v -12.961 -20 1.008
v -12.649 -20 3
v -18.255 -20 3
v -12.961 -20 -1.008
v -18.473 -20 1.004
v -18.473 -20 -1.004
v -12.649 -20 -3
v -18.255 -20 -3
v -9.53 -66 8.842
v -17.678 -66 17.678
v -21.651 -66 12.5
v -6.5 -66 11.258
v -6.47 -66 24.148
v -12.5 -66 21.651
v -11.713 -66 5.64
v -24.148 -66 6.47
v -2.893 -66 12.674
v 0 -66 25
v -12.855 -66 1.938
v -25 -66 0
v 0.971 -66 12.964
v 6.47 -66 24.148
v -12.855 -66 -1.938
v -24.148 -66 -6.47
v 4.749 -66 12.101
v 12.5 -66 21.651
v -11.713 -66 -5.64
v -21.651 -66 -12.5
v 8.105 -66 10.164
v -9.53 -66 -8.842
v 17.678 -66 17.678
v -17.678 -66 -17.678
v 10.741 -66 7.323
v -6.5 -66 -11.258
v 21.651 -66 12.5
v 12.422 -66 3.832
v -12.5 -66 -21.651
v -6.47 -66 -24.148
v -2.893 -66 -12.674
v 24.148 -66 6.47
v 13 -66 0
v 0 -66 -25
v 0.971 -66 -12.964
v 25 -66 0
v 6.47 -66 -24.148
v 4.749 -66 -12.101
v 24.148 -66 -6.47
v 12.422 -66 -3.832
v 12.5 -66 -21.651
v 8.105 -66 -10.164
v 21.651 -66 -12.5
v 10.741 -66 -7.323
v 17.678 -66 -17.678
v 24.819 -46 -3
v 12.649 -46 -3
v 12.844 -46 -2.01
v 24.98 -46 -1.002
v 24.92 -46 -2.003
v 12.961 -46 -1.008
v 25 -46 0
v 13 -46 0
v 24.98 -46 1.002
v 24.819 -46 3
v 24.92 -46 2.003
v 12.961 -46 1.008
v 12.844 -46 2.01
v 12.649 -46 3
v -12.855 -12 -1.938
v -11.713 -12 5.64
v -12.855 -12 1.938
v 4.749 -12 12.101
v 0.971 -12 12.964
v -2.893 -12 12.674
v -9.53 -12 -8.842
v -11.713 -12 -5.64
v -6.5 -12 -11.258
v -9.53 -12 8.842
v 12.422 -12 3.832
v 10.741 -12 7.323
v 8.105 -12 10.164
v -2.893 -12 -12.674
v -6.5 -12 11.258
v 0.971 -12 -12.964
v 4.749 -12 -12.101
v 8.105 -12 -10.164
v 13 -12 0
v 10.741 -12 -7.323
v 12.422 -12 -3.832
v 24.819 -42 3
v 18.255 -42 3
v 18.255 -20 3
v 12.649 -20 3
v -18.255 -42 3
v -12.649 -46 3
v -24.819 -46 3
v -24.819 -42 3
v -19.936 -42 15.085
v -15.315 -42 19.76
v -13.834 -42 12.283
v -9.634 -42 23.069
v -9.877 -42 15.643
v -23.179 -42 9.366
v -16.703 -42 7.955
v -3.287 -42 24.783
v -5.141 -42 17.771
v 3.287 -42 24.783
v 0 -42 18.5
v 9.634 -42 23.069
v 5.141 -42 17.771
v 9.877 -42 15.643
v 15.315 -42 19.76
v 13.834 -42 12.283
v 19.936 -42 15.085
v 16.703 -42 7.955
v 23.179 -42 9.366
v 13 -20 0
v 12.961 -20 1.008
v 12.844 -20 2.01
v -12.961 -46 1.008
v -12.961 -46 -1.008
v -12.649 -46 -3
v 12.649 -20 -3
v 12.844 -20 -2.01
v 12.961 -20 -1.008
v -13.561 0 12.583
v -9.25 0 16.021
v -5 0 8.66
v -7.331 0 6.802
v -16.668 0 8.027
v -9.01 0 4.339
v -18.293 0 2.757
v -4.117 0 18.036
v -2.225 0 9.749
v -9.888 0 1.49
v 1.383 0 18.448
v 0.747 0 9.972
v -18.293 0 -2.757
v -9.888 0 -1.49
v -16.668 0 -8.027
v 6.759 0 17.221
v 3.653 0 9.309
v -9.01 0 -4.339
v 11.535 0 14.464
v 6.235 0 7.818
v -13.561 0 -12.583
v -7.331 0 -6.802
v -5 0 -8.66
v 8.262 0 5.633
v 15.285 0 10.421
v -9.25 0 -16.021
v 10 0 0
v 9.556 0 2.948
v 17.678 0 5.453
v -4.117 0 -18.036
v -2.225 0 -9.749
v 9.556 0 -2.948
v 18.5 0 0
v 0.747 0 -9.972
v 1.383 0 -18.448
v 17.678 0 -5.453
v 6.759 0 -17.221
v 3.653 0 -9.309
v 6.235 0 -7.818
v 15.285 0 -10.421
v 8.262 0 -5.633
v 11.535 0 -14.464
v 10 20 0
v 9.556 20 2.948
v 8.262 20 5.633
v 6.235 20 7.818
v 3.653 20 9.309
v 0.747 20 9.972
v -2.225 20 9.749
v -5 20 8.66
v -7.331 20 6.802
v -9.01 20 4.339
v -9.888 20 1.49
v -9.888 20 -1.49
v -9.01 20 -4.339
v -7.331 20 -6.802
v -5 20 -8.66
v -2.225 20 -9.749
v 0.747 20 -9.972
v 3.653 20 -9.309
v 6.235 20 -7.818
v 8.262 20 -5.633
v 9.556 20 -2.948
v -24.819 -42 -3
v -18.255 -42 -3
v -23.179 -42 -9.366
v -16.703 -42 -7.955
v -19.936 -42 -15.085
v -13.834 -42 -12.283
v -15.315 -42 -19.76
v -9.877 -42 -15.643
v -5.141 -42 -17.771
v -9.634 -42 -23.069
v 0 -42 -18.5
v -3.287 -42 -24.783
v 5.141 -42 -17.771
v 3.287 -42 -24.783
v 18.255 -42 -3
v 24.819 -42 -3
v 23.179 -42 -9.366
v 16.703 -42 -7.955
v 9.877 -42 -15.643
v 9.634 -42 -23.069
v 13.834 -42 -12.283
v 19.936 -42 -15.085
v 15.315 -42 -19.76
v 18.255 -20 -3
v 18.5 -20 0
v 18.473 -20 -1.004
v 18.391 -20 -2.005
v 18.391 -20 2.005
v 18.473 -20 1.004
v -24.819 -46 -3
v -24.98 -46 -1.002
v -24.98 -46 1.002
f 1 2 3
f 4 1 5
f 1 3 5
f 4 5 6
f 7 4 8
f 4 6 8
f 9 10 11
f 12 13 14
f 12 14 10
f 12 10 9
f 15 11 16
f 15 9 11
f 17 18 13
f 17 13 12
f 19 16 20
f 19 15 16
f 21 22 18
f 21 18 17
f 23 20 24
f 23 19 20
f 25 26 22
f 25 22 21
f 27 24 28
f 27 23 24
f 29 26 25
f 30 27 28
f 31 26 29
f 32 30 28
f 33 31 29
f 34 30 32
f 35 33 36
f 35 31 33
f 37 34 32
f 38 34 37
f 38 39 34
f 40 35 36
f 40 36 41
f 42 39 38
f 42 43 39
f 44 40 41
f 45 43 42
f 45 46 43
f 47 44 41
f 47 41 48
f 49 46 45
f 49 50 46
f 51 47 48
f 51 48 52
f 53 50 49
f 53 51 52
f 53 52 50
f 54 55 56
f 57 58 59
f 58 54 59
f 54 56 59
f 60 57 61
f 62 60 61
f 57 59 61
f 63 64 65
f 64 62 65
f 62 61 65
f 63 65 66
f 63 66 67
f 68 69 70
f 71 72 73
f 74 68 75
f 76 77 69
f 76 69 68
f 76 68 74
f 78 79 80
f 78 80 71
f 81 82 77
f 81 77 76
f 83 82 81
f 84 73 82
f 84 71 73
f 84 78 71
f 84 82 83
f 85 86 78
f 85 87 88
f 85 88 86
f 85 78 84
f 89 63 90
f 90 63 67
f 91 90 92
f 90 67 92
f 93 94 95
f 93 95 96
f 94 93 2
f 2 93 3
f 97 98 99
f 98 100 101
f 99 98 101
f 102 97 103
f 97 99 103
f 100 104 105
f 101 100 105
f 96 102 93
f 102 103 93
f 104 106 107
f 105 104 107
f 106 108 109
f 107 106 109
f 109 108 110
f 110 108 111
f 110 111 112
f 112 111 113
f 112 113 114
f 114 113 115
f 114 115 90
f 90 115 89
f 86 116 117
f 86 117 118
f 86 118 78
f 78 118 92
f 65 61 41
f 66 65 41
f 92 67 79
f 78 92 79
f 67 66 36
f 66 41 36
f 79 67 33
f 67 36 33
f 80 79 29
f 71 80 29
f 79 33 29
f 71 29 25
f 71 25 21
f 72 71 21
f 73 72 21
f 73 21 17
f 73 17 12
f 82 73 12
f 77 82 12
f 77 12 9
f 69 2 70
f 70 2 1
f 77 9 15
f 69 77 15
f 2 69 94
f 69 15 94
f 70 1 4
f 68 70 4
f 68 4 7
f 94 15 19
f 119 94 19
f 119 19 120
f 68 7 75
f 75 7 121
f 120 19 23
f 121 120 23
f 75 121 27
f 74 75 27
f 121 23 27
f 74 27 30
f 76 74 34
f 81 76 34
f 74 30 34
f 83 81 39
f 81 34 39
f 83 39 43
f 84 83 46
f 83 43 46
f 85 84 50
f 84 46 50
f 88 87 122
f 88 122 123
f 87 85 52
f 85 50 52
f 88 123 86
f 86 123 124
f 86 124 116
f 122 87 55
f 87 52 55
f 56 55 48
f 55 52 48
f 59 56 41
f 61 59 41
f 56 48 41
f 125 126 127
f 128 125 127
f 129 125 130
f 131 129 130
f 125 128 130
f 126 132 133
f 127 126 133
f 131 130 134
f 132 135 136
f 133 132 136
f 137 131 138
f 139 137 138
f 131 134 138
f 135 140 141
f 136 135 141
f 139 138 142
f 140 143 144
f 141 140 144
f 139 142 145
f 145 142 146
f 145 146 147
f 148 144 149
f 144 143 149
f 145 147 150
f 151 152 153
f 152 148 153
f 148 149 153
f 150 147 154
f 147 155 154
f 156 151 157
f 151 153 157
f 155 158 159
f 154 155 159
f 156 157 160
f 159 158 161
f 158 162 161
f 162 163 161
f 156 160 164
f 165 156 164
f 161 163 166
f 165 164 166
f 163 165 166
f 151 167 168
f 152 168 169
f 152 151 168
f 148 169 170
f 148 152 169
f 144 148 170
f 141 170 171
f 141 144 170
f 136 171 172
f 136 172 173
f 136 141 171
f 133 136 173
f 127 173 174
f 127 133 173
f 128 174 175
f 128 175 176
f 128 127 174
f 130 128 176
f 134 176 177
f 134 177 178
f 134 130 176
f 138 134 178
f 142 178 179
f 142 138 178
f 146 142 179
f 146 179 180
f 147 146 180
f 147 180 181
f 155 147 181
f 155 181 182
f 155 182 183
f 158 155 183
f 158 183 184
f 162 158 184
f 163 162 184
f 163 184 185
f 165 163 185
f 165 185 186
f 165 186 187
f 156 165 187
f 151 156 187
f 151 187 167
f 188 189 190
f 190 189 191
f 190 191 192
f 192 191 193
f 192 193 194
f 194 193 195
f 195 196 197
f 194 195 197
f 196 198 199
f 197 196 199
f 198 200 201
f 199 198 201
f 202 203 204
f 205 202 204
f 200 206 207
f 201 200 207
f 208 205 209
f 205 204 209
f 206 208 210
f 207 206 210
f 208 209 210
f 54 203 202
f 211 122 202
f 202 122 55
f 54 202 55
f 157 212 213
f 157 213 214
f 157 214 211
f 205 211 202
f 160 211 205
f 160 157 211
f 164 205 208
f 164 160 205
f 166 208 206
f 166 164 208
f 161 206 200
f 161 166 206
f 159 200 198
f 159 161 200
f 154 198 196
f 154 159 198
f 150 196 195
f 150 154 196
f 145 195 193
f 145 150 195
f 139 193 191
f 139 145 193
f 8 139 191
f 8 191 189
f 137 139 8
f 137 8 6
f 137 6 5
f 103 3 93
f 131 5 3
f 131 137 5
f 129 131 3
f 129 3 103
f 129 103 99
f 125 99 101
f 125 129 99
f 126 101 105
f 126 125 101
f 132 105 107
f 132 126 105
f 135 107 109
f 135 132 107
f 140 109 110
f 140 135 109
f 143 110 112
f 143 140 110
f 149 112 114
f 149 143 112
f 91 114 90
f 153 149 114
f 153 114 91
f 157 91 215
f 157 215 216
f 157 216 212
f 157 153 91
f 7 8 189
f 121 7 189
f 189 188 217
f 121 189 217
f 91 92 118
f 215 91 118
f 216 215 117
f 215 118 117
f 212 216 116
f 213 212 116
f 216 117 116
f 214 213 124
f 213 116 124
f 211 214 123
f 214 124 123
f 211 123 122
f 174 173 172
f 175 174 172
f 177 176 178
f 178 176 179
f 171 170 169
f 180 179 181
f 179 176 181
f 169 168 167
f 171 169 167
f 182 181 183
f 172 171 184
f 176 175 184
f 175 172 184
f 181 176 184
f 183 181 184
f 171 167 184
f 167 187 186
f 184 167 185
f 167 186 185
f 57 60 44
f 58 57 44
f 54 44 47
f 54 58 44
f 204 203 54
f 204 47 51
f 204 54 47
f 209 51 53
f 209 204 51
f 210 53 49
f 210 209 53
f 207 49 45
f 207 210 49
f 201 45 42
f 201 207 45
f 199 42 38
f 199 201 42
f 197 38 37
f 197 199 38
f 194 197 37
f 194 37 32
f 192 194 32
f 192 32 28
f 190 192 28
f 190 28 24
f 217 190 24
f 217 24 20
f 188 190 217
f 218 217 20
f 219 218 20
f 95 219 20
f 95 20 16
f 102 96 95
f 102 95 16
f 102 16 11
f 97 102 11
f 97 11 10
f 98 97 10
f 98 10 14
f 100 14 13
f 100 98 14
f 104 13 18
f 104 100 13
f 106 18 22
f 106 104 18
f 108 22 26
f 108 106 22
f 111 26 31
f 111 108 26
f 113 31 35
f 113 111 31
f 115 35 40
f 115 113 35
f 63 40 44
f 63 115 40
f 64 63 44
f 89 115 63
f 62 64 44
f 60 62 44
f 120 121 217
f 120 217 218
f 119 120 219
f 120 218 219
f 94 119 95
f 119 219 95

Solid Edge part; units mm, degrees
sketch "Sketch1" plane through (0, 0, 0) normal (0, -1, 0) x (1, 0, 0)
  circle A0 centre (0, 0) radius 10
extrude "Protrusion1" add sketch "Sketch1" against normal blind 20
sketch "Sketch2" plane through (0, 0, 0) normal (0, -1, 0) x (1, 0, 0)
  circle A0 centre (0, 0) radius 18.5
extrude "ExtrudedProtrusion_2" add sketch "Sketch2" along normal blind 42
sketch "Sketch3" plane through (0, -42, 0) normal (0, -1, 0) x (1, 0, 0)
  circle A0 centre (0, 0) radius 25
extrude "ExtrudedProtrusion_3" add sketch "Sketch3" along normal blind 24
sketch "Sketch4" plane through (0, -66, 0) normal (0, -1, 0) x (1, 0, 0)
  circle A0 centre (0, 0) radius 13
extrude "ExtrudedCutout_1" cut sketch "Sketch4" against normal blind 54
sketch "Sketch5" plane through (0, 0, 0) normal (1, 0, 0) x (0, 1, 0)
  line L0 (-46, 3) -> (-20, 3)
  line L1 (-20, 3) -> (-20, -3)
  line L2 (-20, -3) -> (-46, -3)
  line L3 (-46, -3) -> (-46, 3)
  dimension "D1" = 26
  dimension "D2" = 6
  dimension "D3" = 20
extrude "ExtrudedCutout_2" cut sketch "Sketch5" along normal mid plane 185.6851
properties part number "1"
